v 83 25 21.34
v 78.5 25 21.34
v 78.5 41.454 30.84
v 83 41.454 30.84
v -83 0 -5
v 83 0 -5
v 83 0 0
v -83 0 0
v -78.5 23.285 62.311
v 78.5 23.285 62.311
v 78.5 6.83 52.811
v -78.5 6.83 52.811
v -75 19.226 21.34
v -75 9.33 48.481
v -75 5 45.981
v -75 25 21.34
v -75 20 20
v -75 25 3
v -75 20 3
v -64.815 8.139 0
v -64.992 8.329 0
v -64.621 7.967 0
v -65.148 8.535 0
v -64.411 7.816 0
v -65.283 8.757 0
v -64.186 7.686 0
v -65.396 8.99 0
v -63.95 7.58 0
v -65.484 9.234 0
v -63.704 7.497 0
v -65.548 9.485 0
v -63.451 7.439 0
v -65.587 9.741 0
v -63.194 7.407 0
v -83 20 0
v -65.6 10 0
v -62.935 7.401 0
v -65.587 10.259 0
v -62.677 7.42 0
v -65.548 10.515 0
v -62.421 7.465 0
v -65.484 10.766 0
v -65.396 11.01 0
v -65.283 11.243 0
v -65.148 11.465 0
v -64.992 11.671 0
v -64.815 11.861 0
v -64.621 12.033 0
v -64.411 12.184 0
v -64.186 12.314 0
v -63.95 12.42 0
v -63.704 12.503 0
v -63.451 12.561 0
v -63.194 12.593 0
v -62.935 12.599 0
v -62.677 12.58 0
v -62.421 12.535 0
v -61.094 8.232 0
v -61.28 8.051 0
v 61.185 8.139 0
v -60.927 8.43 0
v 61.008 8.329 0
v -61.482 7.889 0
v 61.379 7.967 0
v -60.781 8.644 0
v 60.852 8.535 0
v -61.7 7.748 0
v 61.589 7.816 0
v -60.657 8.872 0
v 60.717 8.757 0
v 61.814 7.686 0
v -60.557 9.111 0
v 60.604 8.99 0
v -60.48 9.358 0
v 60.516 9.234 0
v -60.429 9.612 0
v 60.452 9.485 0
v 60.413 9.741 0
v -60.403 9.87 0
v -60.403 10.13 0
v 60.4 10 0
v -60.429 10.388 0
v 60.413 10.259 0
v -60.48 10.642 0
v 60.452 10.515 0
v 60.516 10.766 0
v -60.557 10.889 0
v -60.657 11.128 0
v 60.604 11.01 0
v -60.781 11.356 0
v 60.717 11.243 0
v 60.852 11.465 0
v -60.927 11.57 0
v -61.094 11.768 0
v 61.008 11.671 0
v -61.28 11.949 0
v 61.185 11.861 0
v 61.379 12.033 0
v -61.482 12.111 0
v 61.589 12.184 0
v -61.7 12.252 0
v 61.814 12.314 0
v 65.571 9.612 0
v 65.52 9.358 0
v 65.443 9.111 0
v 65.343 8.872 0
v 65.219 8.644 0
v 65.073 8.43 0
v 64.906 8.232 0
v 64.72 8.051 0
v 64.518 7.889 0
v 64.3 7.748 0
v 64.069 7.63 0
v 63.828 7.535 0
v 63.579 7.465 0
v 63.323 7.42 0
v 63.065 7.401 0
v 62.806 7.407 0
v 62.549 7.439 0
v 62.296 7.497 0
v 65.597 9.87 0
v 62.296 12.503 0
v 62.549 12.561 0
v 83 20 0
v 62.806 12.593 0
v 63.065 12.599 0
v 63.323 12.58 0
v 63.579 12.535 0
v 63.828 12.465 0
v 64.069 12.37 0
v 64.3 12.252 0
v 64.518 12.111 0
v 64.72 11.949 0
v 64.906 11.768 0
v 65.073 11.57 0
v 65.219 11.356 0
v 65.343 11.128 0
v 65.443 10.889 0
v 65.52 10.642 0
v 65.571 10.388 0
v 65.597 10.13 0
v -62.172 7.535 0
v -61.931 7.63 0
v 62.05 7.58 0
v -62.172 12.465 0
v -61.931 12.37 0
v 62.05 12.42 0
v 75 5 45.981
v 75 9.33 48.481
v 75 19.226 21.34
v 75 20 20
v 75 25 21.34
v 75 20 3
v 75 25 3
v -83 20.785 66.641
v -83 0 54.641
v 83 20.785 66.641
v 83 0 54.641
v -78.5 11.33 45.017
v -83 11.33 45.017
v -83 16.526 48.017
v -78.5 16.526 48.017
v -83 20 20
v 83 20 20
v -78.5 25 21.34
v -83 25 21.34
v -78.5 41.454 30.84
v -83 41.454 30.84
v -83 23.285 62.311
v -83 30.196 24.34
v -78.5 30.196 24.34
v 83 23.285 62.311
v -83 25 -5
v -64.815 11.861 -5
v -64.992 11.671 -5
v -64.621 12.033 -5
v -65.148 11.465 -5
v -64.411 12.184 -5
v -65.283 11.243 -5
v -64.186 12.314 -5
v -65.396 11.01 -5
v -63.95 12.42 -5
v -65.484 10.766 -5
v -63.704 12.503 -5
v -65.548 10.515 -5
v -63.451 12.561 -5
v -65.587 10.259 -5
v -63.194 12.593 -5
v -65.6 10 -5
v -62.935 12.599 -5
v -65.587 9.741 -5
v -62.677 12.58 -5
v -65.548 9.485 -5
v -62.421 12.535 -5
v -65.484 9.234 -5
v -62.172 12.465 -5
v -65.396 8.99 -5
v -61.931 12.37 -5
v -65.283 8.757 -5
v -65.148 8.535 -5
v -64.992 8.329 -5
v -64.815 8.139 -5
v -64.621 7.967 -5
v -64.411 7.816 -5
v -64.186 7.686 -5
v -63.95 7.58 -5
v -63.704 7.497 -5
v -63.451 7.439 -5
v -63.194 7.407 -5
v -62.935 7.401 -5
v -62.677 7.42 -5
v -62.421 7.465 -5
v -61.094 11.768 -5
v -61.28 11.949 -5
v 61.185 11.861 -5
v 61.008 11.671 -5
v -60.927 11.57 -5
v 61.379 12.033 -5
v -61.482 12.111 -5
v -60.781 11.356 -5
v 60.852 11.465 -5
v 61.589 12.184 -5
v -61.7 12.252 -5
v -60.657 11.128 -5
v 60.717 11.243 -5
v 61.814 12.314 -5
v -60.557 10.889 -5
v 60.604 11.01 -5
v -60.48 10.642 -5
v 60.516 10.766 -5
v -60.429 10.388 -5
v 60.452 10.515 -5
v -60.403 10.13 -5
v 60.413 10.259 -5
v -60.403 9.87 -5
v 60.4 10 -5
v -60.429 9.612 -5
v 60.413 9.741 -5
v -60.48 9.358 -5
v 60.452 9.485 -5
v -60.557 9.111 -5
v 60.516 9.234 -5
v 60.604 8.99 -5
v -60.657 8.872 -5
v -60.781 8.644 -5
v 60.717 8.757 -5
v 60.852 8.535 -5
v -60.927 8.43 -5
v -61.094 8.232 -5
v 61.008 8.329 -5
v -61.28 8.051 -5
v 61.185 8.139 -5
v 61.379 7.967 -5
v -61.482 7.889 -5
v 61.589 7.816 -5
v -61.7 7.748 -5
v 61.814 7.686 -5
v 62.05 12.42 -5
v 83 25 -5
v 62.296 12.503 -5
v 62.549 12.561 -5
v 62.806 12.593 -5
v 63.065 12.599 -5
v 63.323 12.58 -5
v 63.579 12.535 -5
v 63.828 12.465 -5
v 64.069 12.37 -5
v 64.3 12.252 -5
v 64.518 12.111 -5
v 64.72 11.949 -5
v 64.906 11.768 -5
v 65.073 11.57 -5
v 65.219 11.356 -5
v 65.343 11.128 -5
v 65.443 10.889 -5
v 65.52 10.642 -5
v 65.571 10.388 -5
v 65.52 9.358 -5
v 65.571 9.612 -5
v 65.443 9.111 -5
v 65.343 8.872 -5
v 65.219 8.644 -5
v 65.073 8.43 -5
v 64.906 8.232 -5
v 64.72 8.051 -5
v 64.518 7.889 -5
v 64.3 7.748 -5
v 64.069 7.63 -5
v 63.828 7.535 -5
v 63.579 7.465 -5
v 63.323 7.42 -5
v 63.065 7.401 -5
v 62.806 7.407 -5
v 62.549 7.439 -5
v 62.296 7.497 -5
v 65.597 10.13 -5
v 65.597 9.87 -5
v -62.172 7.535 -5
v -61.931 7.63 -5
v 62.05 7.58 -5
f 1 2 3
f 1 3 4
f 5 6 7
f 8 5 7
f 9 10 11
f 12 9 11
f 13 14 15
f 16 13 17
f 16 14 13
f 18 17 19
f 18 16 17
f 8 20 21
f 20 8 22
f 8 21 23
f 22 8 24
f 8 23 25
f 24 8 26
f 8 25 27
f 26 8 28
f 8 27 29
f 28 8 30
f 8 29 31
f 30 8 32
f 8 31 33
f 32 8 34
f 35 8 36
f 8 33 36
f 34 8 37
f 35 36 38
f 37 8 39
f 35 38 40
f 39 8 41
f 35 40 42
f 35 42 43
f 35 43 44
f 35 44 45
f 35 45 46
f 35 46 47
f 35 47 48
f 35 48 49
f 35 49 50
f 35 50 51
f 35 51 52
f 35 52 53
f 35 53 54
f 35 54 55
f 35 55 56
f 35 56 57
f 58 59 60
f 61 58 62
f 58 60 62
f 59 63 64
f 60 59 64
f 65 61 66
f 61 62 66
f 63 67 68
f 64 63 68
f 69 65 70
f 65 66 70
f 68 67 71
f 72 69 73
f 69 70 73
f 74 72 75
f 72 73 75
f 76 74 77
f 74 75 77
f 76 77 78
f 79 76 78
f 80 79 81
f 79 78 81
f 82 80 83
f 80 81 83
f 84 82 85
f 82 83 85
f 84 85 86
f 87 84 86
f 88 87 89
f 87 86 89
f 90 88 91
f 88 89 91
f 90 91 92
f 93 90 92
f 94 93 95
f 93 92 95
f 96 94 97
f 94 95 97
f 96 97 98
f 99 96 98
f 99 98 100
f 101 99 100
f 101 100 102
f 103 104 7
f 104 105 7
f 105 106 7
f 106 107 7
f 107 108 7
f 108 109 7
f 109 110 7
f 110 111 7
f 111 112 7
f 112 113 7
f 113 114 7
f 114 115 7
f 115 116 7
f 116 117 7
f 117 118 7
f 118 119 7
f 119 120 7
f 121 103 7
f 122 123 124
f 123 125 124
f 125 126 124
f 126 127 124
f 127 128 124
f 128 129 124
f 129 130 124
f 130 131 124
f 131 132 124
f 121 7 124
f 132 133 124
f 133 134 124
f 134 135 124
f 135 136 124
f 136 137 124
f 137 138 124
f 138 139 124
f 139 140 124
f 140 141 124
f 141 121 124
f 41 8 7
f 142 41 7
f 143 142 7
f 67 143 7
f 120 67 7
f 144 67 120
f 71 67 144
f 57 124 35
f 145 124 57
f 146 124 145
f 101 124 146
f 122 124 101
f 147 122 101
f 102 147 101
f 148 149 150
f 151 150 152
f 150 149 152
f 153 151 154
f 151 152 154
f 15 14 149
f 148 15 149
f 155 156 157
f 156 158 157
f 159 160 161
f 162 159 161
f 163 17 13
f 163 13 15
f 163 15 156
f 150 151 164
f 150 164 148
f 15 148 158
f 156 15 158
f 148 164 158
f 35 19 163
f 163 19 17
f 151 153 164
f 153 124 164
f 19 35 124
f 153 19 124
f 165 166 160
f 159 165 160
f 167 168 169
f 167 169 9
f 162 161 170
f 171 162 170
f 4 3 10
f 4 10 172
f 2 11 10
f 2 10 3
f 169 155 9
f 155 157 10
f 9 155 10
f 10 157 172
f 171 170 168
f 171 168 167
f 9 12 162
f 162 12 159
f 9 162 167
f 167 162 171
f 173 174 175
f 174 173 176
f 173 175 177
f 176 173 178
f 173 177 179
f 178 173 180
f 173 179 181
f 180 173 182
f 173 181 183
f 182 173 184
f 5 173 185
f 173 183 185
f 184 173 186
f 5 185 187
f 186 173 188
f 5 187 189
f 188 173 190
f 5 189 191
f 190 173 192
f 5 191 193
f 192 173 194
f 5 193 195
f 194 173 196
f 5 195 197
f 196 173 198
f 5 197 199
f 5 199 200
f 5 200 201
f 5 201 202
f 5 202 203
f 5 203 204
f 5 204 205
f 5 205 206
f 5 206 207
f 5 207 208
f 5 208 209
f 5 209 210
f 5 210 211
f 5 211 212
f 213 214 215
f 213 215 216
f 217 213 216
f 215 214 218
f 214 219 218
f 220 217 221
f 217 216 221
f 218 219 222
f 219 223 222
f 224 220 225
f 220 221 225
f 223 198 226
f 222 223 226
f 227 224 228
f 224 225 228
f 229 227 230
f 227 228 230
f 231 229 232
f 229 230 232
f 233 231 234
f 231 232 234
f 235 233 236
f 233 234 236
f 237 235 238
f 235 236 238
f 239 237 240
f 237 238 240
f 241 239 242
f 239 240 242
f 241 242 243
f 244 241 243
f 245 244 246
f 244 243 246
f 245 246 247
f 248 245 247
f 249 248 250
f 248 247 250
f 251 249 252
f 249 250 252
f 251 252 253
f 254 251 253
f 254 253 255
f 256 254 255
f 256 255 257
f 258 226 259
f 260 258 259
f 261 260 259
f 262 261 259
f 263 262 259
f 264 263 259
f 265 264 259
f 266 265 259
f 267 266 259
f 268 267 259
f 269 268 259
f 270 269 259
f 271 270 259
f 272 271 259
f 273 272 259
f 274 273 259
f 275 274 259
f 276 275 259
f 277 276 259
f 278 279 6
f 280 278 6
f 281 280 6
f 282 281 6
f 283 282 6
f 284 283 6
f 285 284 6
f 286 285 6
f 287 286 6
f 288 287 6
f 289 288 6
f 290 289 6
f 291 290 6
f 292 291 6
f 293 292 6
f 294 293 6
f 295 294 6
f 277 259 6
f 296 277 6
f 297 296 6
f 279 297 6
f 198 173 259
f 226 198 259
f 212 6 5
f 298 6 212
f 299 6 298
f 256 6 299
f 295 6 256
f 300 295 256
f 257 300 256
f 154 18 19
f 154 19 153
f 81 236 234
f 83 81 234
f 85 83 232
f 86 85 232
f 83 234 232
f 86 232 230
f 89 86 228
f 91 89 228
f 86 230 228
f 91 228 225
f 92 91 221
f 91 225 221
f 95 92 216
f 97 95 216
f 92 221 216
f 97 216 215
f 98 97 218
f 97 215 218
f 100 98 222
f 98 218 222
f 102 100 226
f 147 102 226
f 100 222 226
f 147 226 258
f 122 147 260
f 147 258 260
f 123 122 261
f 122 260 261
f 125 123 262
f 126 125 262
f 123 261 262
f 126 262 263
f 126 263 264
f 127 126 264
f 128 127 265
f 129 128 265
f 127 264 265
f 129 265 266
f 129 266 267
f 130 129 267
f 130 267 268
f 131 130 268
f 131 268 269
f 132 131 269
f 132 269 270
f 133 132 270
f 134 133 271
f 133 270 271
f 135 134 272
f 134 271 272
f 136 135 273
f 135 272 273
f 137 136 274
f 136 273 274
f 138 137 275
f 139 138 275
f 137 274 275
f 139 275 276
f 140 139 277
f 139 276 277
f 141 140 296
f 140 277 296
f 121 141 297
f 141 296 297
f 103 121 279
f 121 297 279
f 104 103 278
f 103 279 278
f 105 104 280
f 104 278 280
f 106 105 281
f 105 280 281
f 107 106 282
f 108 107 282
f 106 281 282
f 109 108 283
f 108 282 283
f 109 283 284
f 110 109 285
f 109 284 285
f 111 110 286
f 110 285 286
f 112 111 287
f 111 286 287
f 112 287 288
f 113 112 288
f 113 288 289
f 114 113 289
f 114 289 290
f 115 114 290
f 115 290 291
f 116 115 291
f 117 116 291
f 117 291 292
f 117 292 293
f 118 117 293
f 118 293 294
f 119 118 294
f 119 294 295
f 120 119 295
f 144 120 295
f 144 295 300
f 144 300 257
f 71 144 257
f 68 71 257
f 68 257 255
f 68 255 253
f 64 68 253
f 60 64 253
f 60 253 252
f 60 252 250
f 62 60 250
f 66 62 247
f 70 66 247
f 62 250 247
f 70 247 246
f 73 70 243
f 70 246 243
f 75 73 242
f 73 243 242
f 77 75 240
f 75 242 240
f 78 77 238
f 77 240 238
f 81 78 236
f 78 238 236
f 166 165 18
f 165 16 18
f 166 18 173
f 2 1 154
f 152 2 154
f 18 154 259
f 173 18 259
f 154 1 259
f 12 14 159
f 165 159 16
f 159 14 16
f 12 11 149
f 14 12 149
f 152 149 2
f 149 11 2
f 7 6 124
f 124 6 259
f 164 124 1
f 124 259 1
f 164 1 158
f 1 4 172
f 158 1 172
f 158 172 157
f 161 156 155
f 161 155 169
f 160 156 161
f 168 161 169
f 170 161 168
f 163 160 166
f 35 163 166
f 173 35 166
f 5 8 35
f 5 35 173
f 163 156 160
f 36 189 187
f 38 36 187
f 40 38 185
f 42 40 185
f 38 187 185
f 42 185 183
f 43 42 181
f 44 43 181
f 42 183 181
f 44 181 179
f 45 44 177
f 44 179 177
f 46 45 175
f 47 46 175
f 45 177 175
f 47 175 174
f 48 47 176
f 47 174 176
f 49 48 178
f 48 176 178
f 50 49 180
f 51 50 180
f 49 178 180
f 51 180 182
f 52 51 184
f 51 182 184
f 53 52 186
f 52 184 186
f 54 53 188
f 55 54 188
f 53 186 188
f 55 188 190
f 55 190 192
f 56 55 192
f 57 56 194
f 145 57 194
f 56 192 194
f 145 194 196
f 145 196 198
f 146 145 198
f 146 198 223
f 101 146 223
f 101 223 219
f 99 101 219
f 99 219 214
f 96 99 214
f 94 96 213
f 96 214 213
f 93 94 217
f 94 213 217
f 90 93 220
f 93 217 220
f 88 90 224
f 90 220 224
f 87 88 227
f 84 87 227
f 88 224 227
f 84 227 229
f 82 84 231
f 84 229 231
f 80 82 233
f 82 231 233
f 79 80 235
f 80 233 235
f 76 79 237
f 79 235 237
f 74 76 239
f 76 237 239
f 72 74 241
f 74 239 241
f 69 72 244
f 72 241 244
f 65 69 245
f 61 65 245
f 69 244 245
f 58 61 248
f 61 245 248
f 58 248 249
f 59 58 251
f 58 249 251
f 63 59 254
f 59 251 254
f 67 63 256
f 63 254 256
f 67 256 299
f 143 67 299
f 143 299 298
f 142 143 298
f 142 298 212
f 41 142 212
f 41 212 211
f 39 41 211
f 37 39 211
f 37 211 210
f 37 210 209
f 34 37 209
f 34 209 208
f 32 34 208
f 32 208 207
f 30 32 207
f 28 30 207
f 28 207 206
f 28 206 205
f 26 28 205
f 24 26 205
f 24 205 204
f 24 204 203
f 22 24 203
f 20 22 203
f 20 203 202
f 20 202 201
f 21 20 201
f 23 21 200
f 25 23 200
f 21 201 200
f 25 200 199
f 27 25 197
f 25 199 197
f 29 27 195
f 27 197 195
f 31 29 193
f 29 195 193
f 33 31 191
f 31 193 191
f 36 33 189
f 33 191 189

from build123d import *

# Parameters (mm, degrees)
BOSS_EXTRUDE1_DEPTH = 83
SKETCH2_W           = 4.5
SKETCH2_H           = 36.339745962
BOSS_EXTRUDE2_DEPTH = 19
SKETCH3_W           = 150
SKETCH3_H           = 18.339745962
CUT_EXTRUDE1_DEPTH  = 6
SKETCH4_W           = 150
SKETCH4_H           = 31.34
CUT_EXTRUDE2_DEPTH  = 5
CUT_EXTRUDE3_DEPTH  = 5
SKETCH6_R           = 2.6
CUT_EXTRUDE4_DEPTH  = 5


with BuildPart() as part:
    # Sketch1 → Boss-Extrude1 (new, symmetric)
    with BuildSketch(Plane(origin=(0, 0, 0), x_dir=(0, 0, -1), z_dir=(1, 0, 0))):
        Polygon((0, 0), (0, 20), (-20, 20), (-54.641016151, 0), (-66.641016151, 20.784609691), (-62.310889132, 23.284609691), (-52.810889132, 6.830127019), (-21.339745962, 25), (5, 25), (5, 0), align=None)
    extrude(amount=BOSS_EXTRUDE1_DEPTH, both=True)

    # Sketch2 → Boss-Extrude2 (add)
    with BuildSketch(Plane(origin=(0, 27.990381057, 16.160254038), x_dir=(1, 0, 0), z_dir=(0, 0.866025403784436, 0.5000000000000044))):
        with Locations((-80.75, -24.150635095)):
            Rectangle(SKETCH2_W, SKETCH2_H)
        with Locations((80.75, -24.150635095)):
            Rectangle(SKETCH2_W, SKETCH2_H)
    extrude(amount=BOSS_EXTRUDE2_DEPTH)

    # Sketch3 → Cut-Extrude1 (cut)
    with BuildSketch(Plane(origin=(0, 25, 0), x_dir=(1, 0, 0), z_dir=(0, 1, 0))):
        with Locations((0, -12.169872981)):
            Rectangle(SKETCH3_W, SKETCH3_H)
    extrude(amount=-CUT_EXTRUDE1_DEPTH, mode=Mode.SUBTRACT)

    # Sketch4 → Cut-Extrude2 (cut)
    with BuildSketch(Plane(origin=(0, 27.990381057, 16.160254038), x_dir=(1, 0, 0), z_dir=(0, 0.8660254037844362, 0.5000000000000046))):
        with Locations((0, -21.650762114)):
            Rectangle(SKETCH4_W, SKETCH4_H)
    extrude(amount=-CUT_EXTRUDE2_DEPTH, mode=Mode.SUBTRACT)

    # Sketch5 → Cut-Extrude3 (cut)
    with BuildSketch(Plane.ZY.offset(83)):
        Polygon((21.339745962, 25), (45.016880502, 11.33), (48.016880502, 16.526152423), (24.339745962, 30.196152423), align=None)
    extrude(amount=-CUT_EXTRUDE3_DEPTH, mode=Mode.SUBTRACT)

    # Sketch6 → Cut-Extrude4 (cut)
    with BuildSketch(Plane(origin=(0, 0, -5), x_dir=(-1, 0, 0), z_dir=(0, 0, -1))):
        with Locations((-63, 10)):
            Circle(SKETCH6_R)
        with Locations((63, 10)):
            Circle(SKETCH6_R)
    extrude(amount=-CUT_EXTRUDE4_DEPTH, mode=Mode.SUBTRACT)


solid = part.part
